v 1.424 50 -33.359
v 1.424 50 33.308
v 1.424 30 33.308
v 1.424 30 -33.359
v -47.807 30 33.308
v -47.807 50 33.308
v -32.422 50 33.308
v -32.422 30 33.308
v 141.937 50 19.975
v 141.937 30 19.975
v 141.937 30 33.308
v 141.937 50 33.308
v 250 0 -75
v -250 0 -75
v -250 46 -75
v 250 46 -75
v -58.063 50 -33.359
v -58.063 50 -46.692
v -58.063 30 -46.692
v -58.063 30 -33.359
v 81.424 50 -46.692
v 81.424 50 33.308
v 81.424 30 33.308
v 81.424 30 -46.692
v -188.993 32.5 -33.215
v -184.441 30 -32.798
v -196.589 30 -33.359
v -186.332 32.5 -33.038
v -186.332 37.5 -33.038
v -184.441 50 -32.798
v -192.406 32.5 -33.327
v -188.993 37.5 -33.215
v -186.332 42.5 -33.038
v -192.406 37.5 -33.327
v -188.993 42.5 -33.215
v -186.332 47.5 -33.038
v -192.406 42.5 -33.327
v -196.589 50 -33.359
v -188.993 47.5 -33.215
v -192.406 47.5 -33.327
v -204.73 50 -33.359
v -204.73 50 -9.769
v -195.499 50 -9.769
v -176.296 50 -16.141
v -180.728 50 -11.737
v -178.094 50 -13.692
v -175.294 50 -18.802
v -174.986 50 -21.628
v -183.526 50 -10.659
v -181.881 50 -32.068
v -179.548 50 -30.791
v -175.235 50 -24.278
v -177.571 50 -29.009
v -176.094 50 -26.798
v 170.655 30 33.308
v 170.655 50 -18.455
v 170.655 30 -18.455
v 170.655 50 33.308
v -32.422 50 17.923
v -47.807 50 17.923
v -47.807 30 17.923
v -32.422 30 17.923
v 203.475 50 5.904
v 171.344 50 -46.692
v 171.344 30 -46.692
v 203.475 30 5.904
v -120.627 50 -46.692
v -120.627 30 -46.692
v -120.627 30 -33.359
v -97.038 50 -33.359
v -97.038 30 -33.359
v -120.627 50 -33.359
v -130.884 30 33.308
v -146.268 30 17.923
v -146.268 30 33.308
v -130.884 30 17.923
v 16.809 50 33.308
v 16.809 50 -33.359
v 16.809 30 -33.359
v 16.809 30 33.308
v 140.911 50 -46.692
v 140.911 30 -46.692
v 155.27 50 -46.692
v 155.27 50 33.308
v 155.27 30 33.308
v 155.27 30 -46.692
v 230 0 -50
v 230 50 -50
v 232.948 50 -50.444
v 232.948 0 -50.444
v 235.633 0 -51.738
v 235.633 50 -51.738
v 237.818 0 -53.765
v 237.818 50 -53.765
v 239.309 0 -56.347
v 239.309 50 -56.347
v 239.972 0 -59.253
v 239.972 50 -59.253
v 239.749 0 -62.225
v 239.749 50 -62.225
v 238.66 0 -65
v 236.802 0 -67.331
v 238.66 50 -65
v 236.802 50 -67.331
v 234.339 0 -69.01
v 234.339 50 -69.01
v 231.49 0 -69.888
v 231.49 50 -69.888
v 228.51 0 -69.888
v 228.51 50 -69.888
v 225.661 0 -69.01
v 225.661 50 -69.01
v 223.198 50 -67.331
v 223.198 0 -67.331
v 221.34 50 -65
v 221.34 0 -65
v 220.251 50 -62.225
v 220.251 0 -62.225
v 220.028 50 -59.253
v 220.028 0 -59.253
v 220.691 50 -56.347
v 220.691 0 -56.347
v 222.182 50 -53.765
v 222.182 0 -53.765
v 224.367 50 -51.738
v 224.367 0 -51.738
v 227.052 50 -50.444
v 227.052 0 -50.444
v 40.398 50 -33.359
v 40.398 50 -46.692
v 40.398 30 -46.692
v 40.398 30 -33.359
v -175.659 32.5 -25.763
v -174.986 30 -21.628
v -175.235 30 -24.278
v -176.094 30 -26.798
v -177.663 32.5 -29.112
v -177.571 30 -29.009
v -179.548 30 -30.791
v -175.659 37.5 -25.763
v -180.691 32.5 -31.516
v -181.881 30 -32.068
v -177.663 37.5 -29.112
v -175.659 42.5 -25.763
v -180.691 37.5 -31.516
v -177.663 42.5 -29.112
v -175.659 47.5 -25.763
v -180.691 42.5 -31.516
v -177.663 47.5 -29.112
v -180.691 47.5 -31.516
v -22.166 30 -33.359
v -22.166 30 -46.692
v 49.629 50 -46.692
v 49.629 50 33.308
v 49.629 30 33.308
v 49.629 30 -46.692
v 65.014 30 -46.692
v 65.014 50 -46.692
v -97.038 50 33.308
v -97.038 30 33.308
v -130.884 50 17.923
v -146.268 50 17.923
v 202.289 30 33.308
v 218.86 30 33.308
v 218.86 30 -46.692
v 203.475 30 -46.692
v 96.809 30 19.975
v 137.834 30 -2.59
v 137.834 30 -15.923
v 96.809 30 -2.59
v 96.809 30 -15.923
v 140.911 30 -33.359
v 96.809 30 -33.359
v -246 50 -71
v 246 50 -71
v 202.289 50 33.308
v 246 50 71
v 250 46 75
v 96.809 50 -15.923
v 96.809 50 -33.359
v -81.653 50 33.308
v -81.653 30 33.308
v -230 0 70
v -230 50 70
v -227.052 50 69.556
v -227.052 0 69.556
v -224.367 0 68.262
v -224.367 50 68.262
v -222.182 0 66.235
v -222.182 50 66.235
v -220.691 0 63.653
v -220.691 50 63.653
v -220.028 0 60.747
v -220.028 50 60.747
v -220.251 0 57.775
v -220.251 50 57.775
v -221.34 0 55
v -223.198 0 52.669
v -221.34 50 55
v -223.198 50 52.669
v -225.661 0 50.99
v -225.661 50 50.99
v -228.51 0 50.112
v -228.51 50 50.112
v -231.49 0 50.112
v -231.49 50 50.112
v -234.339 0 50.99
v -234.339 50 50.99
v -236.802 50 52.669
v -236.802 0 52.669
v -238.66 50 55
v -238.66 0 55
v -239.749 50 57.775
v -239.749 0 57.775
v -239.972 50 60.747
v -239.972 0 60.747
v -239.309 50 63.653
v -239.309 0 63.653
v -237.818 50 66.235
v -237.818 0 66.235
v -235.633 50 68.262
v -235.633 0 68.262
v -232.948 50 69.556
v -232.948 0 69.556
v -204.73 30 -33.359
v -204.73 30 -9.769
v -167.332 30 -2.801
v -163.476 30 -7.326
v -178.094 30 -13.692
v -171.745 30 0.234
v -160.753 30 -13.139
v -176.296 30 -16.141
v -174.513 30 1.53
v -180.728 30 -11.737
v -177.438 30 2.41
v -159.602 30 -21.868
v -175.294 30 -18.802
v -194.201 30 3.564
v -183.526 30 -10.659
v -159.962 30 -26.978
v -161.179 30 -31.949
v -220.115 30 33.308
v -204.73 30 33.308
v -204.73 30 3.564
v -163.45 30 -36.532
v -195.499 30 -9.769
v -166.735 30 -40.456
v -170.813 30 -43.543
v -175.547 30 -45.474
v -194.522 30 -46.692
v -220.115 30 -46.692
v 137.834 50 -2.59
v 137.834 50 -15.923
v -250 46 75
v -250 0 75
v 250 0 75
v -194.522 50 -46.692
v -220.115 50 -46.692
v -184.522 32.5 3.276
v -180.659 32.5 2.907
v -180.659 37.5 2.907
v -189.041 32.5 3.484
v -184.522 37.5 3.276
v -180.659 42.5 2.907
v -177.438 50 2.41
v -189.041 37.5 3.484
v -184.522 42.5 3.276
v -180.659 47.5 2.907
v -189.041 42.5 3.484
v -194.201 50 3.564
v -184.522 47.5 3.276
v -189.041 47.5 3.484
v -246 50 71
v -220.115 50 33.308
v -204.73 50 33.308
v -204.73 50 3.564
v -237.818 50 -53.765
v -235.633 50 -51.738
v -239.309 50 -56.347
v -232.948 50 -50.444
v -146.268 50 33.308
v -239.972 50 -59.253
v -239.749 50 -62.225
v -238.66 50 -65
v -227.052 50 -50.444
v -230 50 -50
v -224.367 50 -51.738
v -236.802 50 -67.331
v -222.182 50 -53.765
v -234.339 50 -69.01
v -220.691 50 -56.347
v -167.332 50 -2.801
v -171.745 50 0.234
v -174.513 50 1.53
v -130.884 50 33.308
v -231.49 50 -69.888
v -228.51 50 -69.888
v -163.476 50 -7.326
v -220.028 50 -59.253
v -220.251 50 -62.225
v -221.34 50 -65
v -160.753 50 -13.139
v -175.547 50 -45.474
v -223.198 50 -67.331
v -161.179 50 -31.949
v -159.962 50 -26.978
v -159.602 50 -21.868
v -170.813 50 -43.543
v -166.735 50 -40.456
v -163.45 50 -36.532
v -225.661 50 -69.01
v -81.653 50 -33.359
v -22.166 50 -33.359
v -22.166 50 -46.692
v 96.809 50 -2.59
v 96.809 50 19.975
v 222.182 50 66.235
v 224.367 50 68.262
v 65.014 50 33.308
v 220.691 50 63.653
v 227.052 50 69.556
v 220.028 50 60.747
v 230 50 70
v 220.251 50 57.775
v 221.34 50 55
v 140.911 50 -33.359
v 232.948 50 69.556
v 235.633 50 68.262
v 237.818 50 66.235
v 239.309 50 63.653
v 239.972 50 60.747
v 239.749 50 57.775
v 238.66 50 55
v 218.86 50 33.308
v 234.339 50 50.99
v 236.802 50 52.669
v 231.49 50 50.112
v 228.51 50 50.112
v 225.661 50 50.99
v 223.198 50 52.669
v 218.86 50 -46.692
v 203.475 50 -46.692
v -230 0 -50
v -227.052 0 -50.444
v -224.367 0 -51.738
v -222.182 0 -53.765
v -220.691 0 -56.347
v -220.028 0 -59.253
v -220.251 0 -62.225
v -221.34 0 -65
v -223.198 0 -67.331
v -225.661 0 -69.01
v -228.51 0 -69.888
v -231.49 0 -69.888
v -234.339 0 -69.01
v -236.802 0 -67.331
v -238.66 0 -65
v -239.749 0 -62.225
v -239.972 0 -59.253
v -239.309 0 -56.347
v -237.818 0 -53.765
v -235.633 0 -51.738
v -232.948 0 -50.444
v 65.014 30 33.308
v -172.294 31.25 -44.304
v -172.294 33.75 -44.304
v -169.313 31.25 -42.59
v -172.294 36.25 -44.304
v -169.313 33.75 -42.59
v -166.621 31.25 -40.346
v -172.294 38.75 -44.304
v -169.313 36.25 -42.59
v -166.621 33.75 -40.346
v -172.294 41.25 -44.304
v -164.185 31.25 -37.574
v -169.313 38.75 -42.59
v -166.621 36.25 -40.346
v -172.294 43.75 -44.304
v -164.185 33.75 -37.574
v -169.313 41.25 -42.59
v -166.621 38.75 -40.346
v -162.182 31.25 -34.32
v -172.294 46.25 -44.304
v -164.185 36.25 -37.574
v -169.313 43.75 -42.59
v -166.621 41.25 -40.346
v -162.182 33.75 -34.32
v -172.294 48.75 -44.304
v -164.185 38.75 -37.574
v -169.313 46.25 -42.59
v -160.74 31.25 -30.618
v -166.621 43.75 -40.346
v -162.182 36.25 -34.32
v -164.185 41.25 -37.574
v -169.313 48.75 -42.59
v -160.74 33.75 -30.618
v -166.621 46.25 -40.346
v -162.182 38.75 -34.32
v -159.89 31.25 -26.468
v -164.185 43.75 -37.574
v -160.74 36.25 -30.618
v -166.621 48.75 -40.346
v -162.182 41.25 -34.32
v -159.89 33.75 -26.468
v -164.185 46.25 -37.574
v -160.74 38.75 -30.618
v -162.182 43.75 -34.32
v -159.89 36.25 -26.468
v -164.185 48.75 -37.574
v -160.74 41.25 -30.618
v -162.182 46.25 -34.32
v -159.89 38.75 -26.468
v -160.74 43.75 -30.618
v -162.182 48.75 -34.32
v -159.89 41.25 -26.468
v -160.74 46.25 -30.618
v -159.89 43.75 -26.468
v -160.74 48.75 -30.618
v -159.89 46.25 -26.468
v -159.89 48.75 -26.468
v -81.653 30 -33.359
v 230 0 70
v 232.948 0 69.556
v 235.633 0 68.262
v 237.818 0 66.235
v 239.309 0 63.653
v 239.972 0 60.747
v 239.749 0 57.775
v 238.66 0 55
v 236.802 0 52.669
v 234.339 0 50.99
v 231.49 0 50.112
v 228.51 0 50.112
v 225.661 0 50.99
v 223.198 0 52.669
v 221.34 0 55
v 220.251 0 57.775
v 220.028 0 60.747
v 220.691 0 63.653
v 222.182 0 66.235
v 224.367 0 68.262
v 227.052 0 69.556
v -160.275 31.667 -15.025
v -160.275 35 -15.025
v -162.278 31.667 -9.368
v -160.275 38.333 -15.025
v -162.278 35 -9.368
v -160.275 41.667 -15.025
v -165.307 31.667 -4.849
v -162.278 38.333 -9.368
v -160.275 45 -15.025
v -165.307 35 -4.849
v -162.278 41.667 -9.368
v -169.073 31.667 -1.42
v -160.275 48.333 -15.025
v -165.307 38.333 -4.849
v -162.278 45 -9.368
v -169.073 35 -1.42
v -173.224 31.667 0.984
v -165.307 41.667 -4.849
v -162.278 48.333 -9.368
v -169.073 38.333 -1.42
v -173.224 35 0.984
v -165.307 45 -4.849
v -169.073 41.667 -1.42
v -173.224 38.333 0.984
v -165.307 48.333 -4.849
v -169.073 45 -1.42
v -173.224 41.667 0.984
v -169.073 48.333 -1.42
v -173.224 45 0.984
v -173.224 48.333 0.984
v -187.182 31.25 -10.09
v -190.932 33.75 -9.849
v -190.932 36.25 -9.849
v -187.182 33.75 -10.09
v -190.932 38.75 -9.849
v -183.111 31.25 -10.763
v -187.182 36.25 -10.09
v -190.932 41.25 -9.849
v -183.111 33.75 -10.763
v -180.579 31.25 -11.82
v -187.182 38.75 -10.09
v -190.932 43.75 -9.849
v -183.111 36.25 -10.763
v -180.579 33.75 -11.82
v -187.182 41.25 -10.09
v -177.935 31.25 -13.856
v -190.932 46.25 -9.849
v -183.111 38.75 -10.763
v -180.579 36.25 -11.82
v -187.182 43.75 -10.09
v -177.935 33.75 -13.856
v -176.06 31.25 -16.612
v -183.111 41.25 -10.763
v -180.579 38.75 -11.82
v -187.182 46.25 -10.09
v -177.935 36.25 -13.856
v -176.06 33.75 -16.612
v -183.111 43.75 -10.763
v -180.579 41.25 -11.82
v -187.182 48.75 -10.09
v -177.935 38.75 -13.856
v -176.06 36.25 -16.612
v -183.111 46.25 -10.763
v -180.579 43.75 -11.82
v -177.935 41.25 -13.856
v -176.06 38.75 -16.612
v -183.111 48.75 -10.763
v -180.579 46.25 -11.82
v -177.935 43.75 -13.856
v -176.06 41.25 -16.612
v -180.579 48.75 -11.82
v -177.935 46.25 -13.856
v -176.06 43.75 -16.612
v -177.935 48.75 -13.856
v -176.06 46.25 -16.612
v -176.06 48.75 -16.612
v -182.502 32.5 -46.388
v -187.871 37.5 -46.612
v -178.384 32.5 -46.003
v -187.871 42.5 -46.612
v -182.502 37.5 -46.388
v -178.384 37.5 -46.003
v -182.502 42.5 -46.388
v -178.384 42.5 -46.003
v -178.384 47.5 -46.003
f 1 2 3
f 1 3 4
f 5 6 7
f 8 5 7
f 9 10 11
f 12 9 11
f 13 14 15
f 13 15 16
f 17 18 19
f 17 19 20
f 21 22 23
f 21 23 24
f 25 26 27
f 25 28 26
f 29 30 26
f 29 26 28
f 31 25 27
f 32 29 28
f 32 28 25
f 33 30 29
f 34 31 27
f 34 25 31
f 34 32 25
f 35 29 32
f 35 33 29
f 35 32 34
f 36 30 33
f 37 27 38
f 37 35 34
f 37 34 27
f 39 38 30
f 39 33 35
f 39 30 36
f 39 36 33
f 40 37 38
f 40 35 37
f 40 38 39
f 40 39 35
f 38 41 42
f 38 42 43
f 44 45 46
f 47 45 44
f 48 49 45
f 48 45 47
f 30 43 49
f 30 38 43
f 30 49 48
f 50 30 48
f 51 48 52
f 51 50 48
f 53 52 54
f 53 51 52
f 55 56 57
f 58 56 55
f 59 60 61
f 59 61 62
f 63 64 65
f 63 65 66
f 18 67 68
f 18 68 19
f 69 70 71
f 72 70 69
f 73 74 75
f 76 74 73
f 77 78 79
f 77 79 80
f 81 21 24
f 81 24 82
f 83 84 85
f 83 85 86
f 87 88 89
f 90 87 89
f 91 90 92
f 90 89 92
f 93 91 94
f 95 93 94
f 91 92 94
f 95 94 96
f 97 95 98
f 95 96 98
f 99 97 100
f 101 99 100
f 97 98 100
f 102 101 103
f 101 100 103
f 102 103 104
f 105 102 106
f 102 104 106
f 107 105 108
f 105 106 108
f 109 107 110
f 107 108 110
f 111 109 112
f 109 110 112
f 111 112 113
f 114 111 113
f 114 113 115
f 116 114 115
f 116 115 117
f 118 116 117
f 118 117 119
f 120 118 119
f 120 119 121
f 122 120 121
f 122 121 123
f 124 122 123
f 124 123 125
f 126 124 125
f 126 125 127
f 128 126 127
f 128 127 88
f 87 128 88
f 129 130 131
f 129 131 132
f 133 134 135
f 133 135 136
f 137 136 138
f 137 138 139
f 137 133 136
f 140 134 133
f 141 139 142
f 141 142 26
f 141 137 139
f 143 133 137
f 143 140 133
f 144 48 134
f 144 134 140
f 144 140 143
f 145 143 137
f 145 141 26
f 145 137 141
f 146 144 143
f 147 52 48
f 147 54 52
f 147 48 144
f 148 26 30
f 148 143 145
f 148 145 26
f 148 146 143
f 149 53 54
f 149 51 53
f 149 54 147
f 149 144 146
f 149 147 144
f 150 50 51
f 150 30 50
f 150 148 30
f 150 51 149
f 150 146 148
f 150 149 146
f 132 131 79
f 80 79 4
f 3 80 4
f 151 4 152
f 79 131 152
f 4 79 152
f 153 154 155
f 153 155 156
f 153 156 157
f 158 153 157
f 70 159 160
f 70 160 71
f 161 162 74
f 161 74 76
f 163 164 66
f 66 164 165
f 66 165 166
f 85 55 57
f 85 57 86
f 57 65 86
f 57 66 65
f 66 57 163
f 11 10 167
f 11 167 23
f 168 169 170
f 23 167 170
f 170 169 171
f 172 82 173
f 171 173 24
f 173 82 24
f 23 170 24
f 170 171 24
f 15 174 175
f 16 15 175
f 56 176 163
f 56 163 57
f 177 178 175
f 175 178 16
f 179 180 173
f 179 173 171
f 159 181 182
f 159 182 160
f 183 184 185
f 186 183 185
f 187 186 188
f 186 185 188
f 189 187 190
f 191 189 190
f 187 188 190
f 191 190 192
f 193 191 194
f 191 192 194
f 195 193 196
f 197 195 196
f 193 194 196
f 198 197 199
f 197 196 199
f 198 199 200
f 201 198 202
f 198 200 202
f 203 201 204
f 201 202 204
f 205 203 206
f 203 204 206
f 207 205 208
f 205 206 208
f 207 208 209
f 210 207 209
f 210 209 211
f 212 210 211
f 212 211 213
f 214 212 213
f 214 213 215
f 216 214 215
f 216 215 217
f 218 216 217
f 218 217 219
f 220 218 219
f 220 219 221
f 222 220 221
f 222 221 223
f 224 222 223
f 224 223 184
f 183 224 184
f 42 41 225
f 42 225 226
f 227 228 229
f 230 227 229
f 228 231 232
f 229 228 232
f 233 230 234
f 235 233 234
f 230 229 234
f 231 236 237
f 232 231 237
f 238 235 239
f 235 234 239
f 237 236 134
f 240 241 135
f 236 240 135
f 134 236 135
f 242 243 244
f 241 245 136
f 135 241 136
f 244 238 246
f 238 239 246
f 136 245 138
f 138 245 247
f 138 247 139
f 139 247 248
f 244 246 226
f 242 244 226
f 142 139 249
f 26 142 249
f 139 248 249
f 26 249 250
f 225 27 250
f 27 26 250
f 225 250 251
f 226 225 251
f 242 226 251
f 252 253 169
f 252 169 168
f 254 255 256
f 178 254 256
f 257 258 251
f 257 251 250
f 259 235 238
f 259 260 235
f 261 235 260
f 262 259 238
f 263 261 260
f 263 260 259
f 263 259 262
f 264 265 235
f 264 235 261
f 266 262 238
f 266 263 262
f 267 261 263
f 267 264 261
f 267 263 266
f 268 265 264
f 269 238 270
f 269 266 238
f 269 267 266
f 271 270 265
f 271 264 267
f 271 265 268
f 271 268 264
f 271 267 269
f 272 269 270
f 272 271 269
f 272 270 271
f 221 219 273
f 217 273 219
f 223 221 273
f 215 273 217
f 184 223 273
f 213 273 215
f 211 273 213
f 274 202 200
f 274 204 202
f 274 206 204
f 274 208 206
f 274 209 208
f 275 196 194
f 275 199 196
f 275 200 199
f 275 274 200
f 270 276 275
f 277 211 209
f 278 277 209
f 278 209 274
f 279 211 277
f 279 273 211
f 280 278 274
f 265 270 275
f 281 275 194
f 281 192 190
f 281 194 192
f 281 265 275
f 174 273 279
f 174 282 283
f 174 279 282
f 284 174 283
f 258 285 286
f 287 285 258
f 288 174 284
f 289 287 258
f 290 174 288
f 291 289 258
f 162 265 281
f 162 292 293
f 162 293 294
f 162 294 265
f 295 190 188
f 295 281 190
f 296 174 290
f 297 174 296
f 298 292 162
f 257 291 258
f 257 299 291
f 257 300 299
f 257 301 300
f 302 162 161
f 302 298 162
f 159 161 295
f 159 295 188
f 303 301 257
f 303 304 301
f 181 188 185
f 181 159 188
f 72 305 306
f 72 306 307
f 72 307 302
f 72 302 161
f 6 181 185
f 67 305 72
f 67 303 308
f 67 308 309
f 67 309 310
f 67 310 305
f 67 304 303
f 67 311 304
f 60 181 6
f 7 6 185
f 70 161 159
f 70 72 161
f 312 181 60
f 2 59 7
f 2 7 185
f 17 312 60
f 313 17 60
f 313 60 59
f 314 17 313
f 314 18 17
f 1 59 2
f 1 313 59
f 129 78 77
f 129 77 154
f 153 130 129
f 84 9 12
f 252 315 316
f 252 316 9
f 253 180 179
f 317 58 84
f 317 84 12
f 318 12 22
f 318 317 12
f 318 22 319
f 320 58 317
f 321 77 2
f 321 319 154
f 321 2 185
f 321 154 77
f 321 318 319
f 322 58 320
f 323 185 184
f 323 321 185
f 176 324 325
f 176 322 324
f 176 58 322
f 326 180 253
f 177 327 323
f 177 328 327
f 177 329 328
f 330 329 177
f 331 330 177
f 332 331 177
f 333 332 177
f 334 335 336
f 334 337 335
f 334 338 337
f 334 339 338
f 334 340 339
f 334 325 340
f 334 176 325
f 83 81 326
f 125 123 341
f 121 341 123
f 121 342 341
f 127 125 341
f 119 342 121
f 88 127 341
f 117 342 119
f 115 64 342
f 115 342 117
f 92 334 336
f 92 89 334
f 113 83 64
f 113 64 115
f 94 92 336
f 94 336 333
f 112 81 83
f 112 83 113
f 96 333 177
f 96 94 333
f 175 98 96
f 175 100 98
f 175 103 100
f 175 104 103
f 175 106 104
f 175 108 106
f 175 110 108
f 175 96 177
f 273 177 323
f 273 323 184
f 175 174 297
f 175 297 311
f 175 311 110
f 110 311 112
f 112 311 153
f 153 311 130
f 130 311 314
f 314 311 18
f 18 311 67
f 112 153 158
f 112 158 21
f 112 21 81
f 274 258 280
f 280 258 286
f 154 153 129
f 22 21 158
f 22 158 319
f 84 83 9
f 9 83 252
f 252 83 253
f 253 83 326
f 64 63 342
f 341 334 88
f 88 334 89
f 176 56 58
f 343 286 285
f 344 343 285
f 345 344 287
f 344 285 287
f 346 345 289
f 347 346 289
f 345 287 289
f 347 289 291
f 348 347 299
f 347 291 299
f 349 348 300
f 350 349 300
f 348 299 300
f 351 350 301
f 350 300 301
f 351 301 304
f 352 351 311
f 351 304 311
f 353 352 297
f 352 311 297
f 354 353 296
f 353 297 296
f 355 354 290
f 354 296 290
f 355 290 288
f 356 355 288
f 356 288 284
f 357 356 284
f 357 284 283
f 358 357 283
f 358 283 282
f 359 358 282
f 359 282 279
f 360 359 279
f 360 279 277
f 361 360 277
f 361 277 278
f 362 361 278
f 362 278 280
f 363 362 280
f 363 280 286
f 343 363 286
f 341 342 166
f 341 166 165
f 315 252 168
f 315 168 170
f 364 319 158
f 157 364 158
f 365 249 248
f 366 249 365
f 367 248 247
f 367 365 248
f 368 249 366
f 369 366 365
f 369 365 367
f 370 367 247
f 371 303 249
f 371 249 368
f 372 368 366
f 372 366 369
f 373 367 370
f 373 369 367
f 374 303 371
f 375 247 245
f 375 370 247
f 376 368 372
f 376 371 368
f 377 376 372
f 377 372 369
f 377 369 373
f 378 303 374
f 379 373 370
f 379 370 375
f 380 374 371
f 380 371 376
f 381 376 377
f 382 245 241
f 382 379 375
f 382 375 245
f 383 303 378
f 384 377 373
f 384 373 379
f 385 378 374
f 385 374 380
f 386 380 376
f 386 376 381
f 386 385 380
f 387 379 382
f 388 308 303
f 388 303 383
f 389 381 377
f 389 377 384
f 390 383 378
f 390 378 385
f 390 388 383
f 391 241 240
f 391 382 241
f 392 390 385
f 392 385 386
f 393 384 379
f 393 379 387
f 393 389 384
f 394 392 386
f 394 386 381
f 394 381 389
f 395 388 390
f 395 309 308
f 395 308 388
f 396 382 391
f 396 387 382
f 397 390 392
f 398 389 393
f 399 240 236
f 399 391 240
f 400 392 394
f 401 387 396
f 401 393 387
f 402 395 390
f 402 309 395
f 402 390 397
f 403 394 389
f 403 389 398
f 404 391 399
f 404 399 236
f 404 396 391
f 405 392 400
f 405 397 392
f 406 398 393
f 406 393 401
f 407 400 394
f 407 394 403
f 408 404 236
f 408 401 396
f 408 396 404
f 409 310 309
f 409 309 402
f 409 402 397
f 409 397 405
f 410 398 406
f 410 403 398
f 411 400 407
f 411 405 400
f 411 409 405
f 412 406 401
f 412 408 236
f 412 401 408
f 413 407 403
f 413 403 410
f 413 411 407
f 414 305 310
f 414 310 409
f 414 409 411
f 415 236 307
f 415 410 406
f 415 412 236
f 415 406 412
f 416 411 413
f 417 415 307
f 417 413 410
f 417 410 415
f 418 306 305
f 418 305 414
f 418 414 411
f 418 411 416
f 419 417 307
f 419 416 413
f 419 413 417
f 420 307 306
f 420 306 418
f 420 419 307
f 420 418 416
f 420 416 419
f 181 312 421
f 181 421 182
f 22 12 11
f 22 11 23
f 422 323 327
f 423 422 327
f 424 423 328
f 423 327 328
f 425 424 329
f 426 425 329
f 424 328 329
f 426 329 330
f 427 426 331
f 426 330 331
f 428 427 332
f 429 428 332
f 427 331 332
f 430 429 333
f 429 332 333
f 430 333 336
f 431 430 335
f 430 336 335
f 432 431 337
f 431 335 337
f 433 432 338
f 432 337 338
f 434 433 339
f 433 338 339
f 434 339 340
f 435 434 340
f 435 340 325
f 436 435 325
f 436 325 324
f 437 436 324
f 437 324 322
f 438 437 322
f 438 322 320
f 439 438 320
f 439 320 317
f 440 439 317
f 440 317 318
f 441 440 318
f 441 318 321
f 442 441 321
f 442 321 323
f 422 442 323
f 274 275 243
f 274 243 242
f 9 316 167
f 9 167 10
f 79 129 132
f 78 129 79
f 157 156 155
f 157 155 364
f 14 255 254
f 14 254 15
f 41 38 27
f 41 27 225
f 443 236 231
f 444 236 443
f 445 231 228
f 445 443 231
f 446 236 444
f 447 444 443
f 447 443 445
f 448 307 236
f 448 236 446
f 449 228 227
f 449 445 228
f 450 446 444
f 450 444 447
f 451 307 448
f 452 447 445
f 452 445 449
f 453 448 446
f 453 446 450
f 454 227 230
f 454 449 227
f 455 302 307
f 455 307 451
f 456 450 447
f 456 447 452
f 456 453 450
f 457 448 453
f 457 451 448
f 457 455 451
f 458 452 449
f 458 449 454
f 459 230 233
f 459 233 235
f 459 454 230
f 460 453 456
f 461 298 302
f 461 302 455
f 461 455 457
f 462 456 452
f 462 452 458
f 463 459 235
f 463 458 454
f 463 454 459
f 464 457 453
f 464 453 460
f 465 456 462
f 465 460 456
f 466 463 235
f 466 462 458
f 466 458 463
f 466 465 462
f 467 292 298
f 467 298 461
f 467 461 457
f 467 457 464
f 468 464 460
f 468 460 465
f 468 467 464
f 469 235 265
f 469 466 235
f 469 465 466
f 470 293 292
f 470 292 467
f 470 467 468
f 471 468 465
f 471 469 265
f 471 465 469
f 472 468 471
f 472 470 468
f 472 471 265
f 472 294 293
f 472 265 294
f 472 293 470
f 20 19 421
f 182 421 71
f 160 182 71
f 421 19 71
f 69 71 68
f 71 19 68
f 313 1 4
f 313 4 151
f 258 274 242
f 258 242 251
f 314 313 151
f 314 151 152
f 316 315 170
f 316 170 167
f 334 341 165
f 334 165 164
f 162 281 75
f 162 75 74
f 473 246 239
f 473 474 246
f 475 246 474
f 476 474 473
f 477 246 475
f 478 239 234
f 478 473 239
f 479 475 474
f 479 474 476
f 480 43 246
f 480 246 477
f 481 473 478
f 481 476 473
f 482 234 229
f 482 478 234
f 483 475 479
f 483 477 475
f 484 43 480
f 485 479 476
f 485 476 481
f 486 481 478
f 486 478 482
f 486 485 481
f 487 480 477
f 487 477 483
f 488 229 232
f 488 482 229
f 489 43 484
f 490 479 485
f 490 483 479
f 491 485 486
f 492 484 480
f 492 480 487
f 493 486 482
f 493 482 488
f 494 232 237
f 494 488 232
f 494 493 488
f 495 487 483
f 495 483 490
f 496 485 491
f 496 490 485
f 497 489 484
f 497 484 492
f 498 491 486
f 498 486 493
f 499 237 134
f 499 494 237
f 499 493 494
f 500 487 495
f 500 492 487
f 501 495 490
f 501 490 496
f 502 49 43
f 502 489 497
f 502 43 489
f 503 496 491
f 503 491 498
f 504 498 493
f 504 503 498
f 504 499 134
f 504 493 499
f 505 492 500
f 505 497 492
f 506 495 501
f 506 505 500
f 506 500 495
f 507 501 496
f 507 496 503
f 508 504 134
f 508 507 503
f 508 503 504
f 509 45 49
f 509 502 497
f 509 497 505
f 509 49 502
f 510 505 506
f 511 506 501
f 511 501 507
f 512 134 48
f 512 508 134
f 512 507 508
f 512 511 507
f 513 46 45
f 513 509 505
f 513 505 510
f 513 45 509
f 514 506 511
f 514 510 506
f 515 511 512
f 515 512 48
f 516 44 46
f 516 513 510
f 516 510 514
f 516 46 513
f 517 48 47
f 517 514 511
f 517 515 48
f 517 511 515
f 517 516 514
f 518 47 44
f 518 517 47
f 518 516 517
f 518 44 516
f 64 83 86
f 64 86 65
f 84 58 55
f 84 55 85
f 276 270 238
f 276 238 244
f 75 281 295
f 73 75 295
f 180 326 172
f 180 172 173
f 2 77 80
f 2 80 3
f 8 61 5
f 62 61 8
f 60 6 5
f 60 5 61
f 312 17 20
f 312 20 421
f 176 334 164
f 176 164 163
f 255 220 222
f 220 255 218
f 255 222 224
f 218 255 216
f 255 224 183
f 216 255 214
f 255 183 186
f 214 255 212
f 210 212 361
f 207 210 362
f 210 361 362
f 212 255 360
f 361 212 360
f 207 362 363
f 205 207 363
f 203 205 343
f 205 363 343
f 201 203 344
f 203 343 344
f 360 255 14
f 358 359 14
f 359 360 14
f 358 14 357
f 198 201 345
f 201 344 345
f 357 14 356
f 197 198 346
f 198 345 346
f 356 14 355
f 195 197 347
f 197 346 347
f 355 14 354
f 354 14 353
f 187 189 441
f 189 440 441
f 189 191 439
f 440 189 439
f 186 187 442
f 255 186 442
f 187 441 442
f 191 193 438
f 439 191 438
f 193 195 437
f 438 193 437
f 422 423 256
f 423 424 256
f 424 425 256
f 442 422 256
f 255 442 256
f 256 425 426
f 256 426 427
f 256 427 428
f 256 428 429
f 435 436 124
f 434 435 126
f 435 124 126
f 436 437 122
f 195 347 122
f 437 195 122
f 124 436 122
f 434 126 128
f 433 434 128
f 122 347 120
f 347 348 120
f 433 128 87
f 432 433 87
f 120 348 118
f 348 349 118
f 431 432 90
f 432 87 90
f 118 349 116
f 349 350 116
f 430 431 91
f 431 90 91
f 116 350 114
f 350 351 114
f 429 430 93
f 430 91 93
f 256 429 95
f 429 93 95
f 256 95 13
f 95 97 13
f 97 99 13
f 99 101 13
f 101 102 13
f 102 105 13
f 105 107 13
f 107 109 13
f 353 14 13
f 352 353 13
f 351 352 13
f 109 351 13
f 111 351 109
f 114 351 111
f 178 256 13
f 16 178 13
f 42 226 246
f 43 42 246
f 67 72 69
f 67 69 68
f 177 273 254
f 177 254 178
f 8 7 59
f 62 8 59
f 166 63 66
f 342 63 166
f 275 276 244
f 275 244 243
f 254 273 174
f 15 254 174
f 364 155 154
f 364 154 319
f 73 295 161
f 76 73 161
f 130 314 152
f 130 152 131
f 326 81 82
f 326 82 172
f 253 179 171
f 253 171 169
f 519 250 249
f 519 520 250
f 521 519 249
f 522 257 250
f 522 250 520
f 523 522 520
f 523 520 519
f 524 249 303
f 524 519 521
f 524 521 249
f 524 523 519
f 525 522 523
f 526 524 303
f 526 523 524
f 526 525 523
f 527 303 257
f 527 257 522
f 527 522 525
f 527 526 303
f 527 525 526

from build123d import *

# Parameters (mm, degrees)
SKETCH1_W           = 500
SKETCH1_H           = 150
BOSS_EXTRUDE1_DEPTH = 50
SKETCH2_W           = 15.384615385
SKETCH2_H           = 15.384615384
SKETCH2_W_2         = 15.384615384
SKETCH2_H_2         = 80
CUT_EXTRUDE1_DEPTH  = 20
SKETCH3_R           = 10
CUT_EXTRUDE2_DEPTH  = 266.753645441
CHAMFER1_SIZE       = 4


with BuildPart() as part:
    # Sketch1 → Boss-Extrude1 (new body)
    with BuildSketch(Plane(origin=(0, 0, 0), x_dir=(1, 0, 0), z_dir=(0, 1, 0))):
        Rectangle(SKETCH1_W, SKETCH1_H)
    extrude(amount=BOSS_EXTRUDE1_DEPTH)

    # Sketch2 → Cut-Extrude1 (cut)
    # profile 1 of 8: a face of its own
    with BuildSketch(Plane(origin=(0, 50, 0), x_dir=(1, 0, 0), z_dir=(0, 1, 0))):
        with BuildLine():
            Line((-220.114547961, -33.307849889), (-220.114547961, 46.692150111))
            Line((-220.114547961, 46.692150111), (-194.521599243, 46.692150111))
            add(Edge.make_bspline(
                [(-194.521599243, 46.692150111), (-193.362373318, 46.690884181), (-191.145215926, 46.68846294), (-187.982575017, 46.621190731), (-185.135090695, 46.525959504), (-182.606989081, 46.407353042), (-180.389374452, 46.23036942), (-178.492194776, 46.025425049), (-176.903503637, 45.804959291), (-175.967970488, 45.576806717), (-175.547240269, 45.474201393)],
                knots=[0, 0, 0, 0, 1.460485487, 2.793352117, 3.985295279, 5.050041172, 5.981765236, 6.787433016, 7.454681457, 8, 8, 8, 8], degree=3))
            add(Edge.make_bspline(
                [(-175.547240269, 45.474201393), (-174.987771388, 45.314675255), (-173.877356736, 44.998053247), (-172.286478808, 44.323065419), (-170.753124402, 43.540790537), (-169.296558471, 42.608460279), (-167.911829693, 41.542626797), (-166.594822019, 40.351982104), (-165.338512035, 39.03115138), (-164.160279176, 37.582743847), (-163.081156481, 36.014063129), (-162.148523341, 34.322789965), (-161.367171772, 32.516275498), (-160.701473221, 30.608095458), (-160.210317655, 28.577791061), (-159.866598053, 26.439469094), (-159.627326323, 24.1921943), (-159.610385144, 22.654342715), (-159.601727448, 21.868432162)],
                knots=[0, 0, 0, 0, 0.907145743, 1.80047177, 2.69161667, 3.591261238, 4.495029544, 5.415863088, 6.359363025, 7.337192411, 8.326890979, 9.326929023, 10.346104993, 11.395420813, 12.477187422, 13.601053412, 14.774031606, 16, 16, 16, 16], degree=3))
            add(Edge.make_bspline(
                [(-159.601727448, 21.868432162), (-159.626419152, 20.674937637), (-159.673952037, 18.377395143), (-160.205760683, 15.083589507), (-161.016899695, 12.074910394), (-162.202437968, 9.380337629), (-163.647855404, 6.989297258), (-165.240012468, 4.833785656), (-167.058021858, 2.978772131), (-169.022220631, 1.394320163), (-171.098019744, 0.097670408), (-173.177576478, -1.007705098), (-175.288951411, -1.857553106), (-176.728482139, -2.227838717), (-177.43826591, -2.410413992)],
                knots=[0, 0, 0, 0, 1.312386234, 2.526415563, 3.661883817, 4.733421185, 5.753802465, 6.732107337, 7.675884281, 8.604170108, 9.50284679, 10.365392406, 11.194030444, 12, 12, 12, 12], degree=3))
            add(Edge.make_bspline(
                [(-177.43826591, -2.410413992), (-177.944874755, -2.5067829), (-179.012745754, -2.70991706), (-180.706325278, -2.912404846), (-182.557499482, -3.136536749), (-184.573882373, -3.282728169), (-186.753034651, -3.419630304), (-189.094110145, -3.484266322), (-191.593763206, -3.562139599), (-193.314257132, -3.563538884), (-194.201086423, -3.564260146)],
                knots=[0, 0, 0, 0, 0.735353946, 1.55003838, 2.431865514, 3.394945452, 4.432993119, 5.54609699, 6.735134699, 8, 8, 8, 8], degree=3))
            Line((-194.201086423, -3.564260146), (-204.729932576, -3.564260146))
            Line((-204.729932576, -3.564260146), (-204.729932576, -33.307849889))
            Line((-204.729932576, -33.307849889), (-220.114547961, -33.307849889))
        make_face()
        with BuildLine():
            Line((-204.729932576, 33.358816777), (-204.729932576, 9.769073188))
            Line((-204.729932576, 9.769073188), (-195.499163346, 9.769073188))
            add(Edge.make_bspline(
                [(-195.499163346, 9.769073188), (-194.703153264, 9.770103954), (-193.180285827, 9.772075938), (-190.995308866, 9.842858626), (-189.017465651, 9.929262023), (-187.242623546, 10.072277323), (-185.681495968, 10.26076807), (-184.32362843, 10.486226744), (-183.167438366, 10.728167456), (-181.917176214, 11.129101986), (-180.580396005, 11.777777497), (-179.152871842, 12.710087135), (-177.89879355, 13.824773264), (-176.855234189, 15.133933521), (-176.021661303, 16.588486417), (-175.42482251, 18.173525213), (-175.039444262, 19.862780272), (-175.004243472, 21.03297104), (-174.986342833, 21.628047547)],
                knots=[0, 0, 0, 0, 1.411705958, 2.700771114, 3.876961699, 4.922619712, 5.858038221, 6.66485904, 7.363650596, 7.950905807, 8.989198271, 9.987739806, 10.967313358, 11.951275539, 12.944273208, 13.927870418, 14.946261014, 16, 16, 16, 16], degree=3))
            add(Edge.make_bspline(
                [(-174.986342833, 21.628047547), (-175.011536019, 22.35284144), (-175.060382286, 23.758121234), (-175.599020255, 25.759474192), (-176.43007709, 27.575726264), (-177.618252422, 29.15036565), (-179.053540257, 30.474507882), (-180.666743883, 31.576241297), (-182.492313993, 32.347242727), (-183.784328311, 32.645977321), (-184.441471038, 32.797919342)],
                knots=[0, 0, 0, 0, 1.085904563, 2.105425768, 3.088705091, 4.068969419, 5.045188284, 6.010769642, 6.988240112, 8, 8, 8, 8], degree=3))
            add(Edge.make_bspline(
                [(-184.441471038, 32.797919342), (-184.724254567, 32.843148261), (-185.351946325, 32.94354244), (-186.39529777, 33.048316251), (-187.629582692, 33.143607927), (-189.056288904, 33.22184524), (-190.669761298, 33.283008702), (-192.475321832, 33.33660298), (-194.468215217, 33.340908569), (-195.862424259, 33.352681985), (-196.588906935, 33.358816777)],
                knots=[0, 0, 0, 0, 0.564603001, 1.253243608, 2.066786758, 3.005752288, 4.070476343, 5.250658742, 6.567396469, 8, 8, 8, 8], degree=3))
            Line((-196.588906935, 33.358816777), (-204.729932576, 33.358816777))
        make_face(mode=Mode.SUBTRACT)
    # profile 2 of 8: a face of its own
    with BuildSketch(Plane(origin=(0, 50, 0), x_dir=(1, 0, 0), z_dir=(0, 1, 0))):
        with Locations((-138.576086422, -25.615542197)):
            Rectangle(SKETCH2_W, SKETCH2_H)
    # profile 3 of 8: a face of its own
    with BuildSketch(Plane(origin=(0, 50, 0), x_dir=(1, 0, 0), z_dir=(0, 1, 0))):
        Polygon((-97.037624884, -33.307849889), (-97.037624884, 33.358816777), (-120.627368474, 33.358816777), (-120.627368474, 46.692150111), (-58.06326591, 46.692150111), (-58.06326591, 33.358816777), (-81.653009499, 33.358816777), (-81.653009499, -33.307849889), align=None)
    # profile 4 of 8: a face of its own
    with BuildSketch(Plane(origin=(0, 50, 0), x_dir=(1, 0, 0), z_dir=(0, 1, 0))):
        with Locations((-40.114547961, -25.615542197)):
            Rectangle(SKETCH2_W_2, SKETCH2_H)
    # profile 5 of 8: a face of its own
    with BuildSketch(Plane(origin=(0, 50, 0), x_dir=(1, 0, 0), z_dir=(0, 1, 0))):
        Polygon((1.423913577, -33.307849889), (1.423913577, 33.358816777), (-22.165830012, 33.358816777), (-22.165830012, 46.692150111), (40.398272552, 46.692150111), (40.398272552, 33.358816777), (16.808528962, 33.358816777), (16.808528962, -33.307849889), align=None)
    # profile 6 of 8: a face of its own
    with BuildSketch(Plane(origin=(0, 50, 0), x_dir=(1, 0, 0), z_dir=(0, 1, 0))):
        with Locations((57.321349475, 6.692150111)):
            Rectangle(SKETCH2_W_2, SKETCH2_H_2)
    # profile 7 of 8: a face of its own
    with BuildSketch(Plane(origin=(0, 50, 0), x_dir=(1, 0, 0), z_dir=(0, 1, 0))):
        Polygon((81.423913577, -33.307849889), (81.423913577, 46.692150111), (140.911093065, 46.692150111), (140.911093065, 33.358816777), (96.808528962, 33.358816777), (96.808528962, 15.922919342), (137.834169988, 15.922919342), (137.834169988, 2.589586008), (96.808528962, 2.589586008), (96.808528962, -19.974516556), (141.93673409, -19.974516556), (141.93673409, -33.307849889), align=None)
    # profile 8 of 8: a face of its own
    with BuildSketch(Plane(origin=(0, 50, 0), x_dir=(1, 0, 0), z_dir=(0, 1, 0))):
        Polygon((155.270067424, -33.307849889), (155.270067424, 46.692150111), (171.343785372, 46.692150111), (203.475195629, -5.904003735), (203.475195629, 46.692150111), (218.859811013, 46.692150111), (218.859811013, -33.307849889), (202.289298193, -33.307849889), (170.654682808, 18.454970624), (170.654682808, -33.307849889), align=None)
    extrude(amount=-CUT_EXTRUDE1_DEPTH, mode=Mode.SUBTRACT)

    # Sketch3 → Cut-Extrude2 (cut, through all)
    with BuildSketch(Plane(origin=(0, 50, 0), x_dir=(1, 0, 0), z_dir=(0, 1, 0))):
        with Locations(Location((-230, 60, 0), (0, 0, 270))):
            Circle(SKETCH3_R)
        with Locations(Location((-230, -60, 0), (0, 0, 270))):
            Circle(SKETCH3_R)
        with Locations(Location((230, -60, 0), (0, 0, 270))):
            Circle(SKETCH3_R)
        with Locations(Location((230, 60, 0), (0, 0, 270))):
            Circle(SKETCH3_R)
    extrude(amount=-CUT_EXTRUDE2_DEPTH, mode=Mode.SUBTRACT)

    # Chamfer1
    chamfer1_edges = [part.edges().sort_by_distance(p)[0] for p in [
        (-250, 50, 0),
        (0, 50, 75),
        (250, 50, 0),
        (0, 50, -75),
    ]]
    chamfer(chamfer1_edges, length=CHAMFER1_SIZE)


solid = part.part
